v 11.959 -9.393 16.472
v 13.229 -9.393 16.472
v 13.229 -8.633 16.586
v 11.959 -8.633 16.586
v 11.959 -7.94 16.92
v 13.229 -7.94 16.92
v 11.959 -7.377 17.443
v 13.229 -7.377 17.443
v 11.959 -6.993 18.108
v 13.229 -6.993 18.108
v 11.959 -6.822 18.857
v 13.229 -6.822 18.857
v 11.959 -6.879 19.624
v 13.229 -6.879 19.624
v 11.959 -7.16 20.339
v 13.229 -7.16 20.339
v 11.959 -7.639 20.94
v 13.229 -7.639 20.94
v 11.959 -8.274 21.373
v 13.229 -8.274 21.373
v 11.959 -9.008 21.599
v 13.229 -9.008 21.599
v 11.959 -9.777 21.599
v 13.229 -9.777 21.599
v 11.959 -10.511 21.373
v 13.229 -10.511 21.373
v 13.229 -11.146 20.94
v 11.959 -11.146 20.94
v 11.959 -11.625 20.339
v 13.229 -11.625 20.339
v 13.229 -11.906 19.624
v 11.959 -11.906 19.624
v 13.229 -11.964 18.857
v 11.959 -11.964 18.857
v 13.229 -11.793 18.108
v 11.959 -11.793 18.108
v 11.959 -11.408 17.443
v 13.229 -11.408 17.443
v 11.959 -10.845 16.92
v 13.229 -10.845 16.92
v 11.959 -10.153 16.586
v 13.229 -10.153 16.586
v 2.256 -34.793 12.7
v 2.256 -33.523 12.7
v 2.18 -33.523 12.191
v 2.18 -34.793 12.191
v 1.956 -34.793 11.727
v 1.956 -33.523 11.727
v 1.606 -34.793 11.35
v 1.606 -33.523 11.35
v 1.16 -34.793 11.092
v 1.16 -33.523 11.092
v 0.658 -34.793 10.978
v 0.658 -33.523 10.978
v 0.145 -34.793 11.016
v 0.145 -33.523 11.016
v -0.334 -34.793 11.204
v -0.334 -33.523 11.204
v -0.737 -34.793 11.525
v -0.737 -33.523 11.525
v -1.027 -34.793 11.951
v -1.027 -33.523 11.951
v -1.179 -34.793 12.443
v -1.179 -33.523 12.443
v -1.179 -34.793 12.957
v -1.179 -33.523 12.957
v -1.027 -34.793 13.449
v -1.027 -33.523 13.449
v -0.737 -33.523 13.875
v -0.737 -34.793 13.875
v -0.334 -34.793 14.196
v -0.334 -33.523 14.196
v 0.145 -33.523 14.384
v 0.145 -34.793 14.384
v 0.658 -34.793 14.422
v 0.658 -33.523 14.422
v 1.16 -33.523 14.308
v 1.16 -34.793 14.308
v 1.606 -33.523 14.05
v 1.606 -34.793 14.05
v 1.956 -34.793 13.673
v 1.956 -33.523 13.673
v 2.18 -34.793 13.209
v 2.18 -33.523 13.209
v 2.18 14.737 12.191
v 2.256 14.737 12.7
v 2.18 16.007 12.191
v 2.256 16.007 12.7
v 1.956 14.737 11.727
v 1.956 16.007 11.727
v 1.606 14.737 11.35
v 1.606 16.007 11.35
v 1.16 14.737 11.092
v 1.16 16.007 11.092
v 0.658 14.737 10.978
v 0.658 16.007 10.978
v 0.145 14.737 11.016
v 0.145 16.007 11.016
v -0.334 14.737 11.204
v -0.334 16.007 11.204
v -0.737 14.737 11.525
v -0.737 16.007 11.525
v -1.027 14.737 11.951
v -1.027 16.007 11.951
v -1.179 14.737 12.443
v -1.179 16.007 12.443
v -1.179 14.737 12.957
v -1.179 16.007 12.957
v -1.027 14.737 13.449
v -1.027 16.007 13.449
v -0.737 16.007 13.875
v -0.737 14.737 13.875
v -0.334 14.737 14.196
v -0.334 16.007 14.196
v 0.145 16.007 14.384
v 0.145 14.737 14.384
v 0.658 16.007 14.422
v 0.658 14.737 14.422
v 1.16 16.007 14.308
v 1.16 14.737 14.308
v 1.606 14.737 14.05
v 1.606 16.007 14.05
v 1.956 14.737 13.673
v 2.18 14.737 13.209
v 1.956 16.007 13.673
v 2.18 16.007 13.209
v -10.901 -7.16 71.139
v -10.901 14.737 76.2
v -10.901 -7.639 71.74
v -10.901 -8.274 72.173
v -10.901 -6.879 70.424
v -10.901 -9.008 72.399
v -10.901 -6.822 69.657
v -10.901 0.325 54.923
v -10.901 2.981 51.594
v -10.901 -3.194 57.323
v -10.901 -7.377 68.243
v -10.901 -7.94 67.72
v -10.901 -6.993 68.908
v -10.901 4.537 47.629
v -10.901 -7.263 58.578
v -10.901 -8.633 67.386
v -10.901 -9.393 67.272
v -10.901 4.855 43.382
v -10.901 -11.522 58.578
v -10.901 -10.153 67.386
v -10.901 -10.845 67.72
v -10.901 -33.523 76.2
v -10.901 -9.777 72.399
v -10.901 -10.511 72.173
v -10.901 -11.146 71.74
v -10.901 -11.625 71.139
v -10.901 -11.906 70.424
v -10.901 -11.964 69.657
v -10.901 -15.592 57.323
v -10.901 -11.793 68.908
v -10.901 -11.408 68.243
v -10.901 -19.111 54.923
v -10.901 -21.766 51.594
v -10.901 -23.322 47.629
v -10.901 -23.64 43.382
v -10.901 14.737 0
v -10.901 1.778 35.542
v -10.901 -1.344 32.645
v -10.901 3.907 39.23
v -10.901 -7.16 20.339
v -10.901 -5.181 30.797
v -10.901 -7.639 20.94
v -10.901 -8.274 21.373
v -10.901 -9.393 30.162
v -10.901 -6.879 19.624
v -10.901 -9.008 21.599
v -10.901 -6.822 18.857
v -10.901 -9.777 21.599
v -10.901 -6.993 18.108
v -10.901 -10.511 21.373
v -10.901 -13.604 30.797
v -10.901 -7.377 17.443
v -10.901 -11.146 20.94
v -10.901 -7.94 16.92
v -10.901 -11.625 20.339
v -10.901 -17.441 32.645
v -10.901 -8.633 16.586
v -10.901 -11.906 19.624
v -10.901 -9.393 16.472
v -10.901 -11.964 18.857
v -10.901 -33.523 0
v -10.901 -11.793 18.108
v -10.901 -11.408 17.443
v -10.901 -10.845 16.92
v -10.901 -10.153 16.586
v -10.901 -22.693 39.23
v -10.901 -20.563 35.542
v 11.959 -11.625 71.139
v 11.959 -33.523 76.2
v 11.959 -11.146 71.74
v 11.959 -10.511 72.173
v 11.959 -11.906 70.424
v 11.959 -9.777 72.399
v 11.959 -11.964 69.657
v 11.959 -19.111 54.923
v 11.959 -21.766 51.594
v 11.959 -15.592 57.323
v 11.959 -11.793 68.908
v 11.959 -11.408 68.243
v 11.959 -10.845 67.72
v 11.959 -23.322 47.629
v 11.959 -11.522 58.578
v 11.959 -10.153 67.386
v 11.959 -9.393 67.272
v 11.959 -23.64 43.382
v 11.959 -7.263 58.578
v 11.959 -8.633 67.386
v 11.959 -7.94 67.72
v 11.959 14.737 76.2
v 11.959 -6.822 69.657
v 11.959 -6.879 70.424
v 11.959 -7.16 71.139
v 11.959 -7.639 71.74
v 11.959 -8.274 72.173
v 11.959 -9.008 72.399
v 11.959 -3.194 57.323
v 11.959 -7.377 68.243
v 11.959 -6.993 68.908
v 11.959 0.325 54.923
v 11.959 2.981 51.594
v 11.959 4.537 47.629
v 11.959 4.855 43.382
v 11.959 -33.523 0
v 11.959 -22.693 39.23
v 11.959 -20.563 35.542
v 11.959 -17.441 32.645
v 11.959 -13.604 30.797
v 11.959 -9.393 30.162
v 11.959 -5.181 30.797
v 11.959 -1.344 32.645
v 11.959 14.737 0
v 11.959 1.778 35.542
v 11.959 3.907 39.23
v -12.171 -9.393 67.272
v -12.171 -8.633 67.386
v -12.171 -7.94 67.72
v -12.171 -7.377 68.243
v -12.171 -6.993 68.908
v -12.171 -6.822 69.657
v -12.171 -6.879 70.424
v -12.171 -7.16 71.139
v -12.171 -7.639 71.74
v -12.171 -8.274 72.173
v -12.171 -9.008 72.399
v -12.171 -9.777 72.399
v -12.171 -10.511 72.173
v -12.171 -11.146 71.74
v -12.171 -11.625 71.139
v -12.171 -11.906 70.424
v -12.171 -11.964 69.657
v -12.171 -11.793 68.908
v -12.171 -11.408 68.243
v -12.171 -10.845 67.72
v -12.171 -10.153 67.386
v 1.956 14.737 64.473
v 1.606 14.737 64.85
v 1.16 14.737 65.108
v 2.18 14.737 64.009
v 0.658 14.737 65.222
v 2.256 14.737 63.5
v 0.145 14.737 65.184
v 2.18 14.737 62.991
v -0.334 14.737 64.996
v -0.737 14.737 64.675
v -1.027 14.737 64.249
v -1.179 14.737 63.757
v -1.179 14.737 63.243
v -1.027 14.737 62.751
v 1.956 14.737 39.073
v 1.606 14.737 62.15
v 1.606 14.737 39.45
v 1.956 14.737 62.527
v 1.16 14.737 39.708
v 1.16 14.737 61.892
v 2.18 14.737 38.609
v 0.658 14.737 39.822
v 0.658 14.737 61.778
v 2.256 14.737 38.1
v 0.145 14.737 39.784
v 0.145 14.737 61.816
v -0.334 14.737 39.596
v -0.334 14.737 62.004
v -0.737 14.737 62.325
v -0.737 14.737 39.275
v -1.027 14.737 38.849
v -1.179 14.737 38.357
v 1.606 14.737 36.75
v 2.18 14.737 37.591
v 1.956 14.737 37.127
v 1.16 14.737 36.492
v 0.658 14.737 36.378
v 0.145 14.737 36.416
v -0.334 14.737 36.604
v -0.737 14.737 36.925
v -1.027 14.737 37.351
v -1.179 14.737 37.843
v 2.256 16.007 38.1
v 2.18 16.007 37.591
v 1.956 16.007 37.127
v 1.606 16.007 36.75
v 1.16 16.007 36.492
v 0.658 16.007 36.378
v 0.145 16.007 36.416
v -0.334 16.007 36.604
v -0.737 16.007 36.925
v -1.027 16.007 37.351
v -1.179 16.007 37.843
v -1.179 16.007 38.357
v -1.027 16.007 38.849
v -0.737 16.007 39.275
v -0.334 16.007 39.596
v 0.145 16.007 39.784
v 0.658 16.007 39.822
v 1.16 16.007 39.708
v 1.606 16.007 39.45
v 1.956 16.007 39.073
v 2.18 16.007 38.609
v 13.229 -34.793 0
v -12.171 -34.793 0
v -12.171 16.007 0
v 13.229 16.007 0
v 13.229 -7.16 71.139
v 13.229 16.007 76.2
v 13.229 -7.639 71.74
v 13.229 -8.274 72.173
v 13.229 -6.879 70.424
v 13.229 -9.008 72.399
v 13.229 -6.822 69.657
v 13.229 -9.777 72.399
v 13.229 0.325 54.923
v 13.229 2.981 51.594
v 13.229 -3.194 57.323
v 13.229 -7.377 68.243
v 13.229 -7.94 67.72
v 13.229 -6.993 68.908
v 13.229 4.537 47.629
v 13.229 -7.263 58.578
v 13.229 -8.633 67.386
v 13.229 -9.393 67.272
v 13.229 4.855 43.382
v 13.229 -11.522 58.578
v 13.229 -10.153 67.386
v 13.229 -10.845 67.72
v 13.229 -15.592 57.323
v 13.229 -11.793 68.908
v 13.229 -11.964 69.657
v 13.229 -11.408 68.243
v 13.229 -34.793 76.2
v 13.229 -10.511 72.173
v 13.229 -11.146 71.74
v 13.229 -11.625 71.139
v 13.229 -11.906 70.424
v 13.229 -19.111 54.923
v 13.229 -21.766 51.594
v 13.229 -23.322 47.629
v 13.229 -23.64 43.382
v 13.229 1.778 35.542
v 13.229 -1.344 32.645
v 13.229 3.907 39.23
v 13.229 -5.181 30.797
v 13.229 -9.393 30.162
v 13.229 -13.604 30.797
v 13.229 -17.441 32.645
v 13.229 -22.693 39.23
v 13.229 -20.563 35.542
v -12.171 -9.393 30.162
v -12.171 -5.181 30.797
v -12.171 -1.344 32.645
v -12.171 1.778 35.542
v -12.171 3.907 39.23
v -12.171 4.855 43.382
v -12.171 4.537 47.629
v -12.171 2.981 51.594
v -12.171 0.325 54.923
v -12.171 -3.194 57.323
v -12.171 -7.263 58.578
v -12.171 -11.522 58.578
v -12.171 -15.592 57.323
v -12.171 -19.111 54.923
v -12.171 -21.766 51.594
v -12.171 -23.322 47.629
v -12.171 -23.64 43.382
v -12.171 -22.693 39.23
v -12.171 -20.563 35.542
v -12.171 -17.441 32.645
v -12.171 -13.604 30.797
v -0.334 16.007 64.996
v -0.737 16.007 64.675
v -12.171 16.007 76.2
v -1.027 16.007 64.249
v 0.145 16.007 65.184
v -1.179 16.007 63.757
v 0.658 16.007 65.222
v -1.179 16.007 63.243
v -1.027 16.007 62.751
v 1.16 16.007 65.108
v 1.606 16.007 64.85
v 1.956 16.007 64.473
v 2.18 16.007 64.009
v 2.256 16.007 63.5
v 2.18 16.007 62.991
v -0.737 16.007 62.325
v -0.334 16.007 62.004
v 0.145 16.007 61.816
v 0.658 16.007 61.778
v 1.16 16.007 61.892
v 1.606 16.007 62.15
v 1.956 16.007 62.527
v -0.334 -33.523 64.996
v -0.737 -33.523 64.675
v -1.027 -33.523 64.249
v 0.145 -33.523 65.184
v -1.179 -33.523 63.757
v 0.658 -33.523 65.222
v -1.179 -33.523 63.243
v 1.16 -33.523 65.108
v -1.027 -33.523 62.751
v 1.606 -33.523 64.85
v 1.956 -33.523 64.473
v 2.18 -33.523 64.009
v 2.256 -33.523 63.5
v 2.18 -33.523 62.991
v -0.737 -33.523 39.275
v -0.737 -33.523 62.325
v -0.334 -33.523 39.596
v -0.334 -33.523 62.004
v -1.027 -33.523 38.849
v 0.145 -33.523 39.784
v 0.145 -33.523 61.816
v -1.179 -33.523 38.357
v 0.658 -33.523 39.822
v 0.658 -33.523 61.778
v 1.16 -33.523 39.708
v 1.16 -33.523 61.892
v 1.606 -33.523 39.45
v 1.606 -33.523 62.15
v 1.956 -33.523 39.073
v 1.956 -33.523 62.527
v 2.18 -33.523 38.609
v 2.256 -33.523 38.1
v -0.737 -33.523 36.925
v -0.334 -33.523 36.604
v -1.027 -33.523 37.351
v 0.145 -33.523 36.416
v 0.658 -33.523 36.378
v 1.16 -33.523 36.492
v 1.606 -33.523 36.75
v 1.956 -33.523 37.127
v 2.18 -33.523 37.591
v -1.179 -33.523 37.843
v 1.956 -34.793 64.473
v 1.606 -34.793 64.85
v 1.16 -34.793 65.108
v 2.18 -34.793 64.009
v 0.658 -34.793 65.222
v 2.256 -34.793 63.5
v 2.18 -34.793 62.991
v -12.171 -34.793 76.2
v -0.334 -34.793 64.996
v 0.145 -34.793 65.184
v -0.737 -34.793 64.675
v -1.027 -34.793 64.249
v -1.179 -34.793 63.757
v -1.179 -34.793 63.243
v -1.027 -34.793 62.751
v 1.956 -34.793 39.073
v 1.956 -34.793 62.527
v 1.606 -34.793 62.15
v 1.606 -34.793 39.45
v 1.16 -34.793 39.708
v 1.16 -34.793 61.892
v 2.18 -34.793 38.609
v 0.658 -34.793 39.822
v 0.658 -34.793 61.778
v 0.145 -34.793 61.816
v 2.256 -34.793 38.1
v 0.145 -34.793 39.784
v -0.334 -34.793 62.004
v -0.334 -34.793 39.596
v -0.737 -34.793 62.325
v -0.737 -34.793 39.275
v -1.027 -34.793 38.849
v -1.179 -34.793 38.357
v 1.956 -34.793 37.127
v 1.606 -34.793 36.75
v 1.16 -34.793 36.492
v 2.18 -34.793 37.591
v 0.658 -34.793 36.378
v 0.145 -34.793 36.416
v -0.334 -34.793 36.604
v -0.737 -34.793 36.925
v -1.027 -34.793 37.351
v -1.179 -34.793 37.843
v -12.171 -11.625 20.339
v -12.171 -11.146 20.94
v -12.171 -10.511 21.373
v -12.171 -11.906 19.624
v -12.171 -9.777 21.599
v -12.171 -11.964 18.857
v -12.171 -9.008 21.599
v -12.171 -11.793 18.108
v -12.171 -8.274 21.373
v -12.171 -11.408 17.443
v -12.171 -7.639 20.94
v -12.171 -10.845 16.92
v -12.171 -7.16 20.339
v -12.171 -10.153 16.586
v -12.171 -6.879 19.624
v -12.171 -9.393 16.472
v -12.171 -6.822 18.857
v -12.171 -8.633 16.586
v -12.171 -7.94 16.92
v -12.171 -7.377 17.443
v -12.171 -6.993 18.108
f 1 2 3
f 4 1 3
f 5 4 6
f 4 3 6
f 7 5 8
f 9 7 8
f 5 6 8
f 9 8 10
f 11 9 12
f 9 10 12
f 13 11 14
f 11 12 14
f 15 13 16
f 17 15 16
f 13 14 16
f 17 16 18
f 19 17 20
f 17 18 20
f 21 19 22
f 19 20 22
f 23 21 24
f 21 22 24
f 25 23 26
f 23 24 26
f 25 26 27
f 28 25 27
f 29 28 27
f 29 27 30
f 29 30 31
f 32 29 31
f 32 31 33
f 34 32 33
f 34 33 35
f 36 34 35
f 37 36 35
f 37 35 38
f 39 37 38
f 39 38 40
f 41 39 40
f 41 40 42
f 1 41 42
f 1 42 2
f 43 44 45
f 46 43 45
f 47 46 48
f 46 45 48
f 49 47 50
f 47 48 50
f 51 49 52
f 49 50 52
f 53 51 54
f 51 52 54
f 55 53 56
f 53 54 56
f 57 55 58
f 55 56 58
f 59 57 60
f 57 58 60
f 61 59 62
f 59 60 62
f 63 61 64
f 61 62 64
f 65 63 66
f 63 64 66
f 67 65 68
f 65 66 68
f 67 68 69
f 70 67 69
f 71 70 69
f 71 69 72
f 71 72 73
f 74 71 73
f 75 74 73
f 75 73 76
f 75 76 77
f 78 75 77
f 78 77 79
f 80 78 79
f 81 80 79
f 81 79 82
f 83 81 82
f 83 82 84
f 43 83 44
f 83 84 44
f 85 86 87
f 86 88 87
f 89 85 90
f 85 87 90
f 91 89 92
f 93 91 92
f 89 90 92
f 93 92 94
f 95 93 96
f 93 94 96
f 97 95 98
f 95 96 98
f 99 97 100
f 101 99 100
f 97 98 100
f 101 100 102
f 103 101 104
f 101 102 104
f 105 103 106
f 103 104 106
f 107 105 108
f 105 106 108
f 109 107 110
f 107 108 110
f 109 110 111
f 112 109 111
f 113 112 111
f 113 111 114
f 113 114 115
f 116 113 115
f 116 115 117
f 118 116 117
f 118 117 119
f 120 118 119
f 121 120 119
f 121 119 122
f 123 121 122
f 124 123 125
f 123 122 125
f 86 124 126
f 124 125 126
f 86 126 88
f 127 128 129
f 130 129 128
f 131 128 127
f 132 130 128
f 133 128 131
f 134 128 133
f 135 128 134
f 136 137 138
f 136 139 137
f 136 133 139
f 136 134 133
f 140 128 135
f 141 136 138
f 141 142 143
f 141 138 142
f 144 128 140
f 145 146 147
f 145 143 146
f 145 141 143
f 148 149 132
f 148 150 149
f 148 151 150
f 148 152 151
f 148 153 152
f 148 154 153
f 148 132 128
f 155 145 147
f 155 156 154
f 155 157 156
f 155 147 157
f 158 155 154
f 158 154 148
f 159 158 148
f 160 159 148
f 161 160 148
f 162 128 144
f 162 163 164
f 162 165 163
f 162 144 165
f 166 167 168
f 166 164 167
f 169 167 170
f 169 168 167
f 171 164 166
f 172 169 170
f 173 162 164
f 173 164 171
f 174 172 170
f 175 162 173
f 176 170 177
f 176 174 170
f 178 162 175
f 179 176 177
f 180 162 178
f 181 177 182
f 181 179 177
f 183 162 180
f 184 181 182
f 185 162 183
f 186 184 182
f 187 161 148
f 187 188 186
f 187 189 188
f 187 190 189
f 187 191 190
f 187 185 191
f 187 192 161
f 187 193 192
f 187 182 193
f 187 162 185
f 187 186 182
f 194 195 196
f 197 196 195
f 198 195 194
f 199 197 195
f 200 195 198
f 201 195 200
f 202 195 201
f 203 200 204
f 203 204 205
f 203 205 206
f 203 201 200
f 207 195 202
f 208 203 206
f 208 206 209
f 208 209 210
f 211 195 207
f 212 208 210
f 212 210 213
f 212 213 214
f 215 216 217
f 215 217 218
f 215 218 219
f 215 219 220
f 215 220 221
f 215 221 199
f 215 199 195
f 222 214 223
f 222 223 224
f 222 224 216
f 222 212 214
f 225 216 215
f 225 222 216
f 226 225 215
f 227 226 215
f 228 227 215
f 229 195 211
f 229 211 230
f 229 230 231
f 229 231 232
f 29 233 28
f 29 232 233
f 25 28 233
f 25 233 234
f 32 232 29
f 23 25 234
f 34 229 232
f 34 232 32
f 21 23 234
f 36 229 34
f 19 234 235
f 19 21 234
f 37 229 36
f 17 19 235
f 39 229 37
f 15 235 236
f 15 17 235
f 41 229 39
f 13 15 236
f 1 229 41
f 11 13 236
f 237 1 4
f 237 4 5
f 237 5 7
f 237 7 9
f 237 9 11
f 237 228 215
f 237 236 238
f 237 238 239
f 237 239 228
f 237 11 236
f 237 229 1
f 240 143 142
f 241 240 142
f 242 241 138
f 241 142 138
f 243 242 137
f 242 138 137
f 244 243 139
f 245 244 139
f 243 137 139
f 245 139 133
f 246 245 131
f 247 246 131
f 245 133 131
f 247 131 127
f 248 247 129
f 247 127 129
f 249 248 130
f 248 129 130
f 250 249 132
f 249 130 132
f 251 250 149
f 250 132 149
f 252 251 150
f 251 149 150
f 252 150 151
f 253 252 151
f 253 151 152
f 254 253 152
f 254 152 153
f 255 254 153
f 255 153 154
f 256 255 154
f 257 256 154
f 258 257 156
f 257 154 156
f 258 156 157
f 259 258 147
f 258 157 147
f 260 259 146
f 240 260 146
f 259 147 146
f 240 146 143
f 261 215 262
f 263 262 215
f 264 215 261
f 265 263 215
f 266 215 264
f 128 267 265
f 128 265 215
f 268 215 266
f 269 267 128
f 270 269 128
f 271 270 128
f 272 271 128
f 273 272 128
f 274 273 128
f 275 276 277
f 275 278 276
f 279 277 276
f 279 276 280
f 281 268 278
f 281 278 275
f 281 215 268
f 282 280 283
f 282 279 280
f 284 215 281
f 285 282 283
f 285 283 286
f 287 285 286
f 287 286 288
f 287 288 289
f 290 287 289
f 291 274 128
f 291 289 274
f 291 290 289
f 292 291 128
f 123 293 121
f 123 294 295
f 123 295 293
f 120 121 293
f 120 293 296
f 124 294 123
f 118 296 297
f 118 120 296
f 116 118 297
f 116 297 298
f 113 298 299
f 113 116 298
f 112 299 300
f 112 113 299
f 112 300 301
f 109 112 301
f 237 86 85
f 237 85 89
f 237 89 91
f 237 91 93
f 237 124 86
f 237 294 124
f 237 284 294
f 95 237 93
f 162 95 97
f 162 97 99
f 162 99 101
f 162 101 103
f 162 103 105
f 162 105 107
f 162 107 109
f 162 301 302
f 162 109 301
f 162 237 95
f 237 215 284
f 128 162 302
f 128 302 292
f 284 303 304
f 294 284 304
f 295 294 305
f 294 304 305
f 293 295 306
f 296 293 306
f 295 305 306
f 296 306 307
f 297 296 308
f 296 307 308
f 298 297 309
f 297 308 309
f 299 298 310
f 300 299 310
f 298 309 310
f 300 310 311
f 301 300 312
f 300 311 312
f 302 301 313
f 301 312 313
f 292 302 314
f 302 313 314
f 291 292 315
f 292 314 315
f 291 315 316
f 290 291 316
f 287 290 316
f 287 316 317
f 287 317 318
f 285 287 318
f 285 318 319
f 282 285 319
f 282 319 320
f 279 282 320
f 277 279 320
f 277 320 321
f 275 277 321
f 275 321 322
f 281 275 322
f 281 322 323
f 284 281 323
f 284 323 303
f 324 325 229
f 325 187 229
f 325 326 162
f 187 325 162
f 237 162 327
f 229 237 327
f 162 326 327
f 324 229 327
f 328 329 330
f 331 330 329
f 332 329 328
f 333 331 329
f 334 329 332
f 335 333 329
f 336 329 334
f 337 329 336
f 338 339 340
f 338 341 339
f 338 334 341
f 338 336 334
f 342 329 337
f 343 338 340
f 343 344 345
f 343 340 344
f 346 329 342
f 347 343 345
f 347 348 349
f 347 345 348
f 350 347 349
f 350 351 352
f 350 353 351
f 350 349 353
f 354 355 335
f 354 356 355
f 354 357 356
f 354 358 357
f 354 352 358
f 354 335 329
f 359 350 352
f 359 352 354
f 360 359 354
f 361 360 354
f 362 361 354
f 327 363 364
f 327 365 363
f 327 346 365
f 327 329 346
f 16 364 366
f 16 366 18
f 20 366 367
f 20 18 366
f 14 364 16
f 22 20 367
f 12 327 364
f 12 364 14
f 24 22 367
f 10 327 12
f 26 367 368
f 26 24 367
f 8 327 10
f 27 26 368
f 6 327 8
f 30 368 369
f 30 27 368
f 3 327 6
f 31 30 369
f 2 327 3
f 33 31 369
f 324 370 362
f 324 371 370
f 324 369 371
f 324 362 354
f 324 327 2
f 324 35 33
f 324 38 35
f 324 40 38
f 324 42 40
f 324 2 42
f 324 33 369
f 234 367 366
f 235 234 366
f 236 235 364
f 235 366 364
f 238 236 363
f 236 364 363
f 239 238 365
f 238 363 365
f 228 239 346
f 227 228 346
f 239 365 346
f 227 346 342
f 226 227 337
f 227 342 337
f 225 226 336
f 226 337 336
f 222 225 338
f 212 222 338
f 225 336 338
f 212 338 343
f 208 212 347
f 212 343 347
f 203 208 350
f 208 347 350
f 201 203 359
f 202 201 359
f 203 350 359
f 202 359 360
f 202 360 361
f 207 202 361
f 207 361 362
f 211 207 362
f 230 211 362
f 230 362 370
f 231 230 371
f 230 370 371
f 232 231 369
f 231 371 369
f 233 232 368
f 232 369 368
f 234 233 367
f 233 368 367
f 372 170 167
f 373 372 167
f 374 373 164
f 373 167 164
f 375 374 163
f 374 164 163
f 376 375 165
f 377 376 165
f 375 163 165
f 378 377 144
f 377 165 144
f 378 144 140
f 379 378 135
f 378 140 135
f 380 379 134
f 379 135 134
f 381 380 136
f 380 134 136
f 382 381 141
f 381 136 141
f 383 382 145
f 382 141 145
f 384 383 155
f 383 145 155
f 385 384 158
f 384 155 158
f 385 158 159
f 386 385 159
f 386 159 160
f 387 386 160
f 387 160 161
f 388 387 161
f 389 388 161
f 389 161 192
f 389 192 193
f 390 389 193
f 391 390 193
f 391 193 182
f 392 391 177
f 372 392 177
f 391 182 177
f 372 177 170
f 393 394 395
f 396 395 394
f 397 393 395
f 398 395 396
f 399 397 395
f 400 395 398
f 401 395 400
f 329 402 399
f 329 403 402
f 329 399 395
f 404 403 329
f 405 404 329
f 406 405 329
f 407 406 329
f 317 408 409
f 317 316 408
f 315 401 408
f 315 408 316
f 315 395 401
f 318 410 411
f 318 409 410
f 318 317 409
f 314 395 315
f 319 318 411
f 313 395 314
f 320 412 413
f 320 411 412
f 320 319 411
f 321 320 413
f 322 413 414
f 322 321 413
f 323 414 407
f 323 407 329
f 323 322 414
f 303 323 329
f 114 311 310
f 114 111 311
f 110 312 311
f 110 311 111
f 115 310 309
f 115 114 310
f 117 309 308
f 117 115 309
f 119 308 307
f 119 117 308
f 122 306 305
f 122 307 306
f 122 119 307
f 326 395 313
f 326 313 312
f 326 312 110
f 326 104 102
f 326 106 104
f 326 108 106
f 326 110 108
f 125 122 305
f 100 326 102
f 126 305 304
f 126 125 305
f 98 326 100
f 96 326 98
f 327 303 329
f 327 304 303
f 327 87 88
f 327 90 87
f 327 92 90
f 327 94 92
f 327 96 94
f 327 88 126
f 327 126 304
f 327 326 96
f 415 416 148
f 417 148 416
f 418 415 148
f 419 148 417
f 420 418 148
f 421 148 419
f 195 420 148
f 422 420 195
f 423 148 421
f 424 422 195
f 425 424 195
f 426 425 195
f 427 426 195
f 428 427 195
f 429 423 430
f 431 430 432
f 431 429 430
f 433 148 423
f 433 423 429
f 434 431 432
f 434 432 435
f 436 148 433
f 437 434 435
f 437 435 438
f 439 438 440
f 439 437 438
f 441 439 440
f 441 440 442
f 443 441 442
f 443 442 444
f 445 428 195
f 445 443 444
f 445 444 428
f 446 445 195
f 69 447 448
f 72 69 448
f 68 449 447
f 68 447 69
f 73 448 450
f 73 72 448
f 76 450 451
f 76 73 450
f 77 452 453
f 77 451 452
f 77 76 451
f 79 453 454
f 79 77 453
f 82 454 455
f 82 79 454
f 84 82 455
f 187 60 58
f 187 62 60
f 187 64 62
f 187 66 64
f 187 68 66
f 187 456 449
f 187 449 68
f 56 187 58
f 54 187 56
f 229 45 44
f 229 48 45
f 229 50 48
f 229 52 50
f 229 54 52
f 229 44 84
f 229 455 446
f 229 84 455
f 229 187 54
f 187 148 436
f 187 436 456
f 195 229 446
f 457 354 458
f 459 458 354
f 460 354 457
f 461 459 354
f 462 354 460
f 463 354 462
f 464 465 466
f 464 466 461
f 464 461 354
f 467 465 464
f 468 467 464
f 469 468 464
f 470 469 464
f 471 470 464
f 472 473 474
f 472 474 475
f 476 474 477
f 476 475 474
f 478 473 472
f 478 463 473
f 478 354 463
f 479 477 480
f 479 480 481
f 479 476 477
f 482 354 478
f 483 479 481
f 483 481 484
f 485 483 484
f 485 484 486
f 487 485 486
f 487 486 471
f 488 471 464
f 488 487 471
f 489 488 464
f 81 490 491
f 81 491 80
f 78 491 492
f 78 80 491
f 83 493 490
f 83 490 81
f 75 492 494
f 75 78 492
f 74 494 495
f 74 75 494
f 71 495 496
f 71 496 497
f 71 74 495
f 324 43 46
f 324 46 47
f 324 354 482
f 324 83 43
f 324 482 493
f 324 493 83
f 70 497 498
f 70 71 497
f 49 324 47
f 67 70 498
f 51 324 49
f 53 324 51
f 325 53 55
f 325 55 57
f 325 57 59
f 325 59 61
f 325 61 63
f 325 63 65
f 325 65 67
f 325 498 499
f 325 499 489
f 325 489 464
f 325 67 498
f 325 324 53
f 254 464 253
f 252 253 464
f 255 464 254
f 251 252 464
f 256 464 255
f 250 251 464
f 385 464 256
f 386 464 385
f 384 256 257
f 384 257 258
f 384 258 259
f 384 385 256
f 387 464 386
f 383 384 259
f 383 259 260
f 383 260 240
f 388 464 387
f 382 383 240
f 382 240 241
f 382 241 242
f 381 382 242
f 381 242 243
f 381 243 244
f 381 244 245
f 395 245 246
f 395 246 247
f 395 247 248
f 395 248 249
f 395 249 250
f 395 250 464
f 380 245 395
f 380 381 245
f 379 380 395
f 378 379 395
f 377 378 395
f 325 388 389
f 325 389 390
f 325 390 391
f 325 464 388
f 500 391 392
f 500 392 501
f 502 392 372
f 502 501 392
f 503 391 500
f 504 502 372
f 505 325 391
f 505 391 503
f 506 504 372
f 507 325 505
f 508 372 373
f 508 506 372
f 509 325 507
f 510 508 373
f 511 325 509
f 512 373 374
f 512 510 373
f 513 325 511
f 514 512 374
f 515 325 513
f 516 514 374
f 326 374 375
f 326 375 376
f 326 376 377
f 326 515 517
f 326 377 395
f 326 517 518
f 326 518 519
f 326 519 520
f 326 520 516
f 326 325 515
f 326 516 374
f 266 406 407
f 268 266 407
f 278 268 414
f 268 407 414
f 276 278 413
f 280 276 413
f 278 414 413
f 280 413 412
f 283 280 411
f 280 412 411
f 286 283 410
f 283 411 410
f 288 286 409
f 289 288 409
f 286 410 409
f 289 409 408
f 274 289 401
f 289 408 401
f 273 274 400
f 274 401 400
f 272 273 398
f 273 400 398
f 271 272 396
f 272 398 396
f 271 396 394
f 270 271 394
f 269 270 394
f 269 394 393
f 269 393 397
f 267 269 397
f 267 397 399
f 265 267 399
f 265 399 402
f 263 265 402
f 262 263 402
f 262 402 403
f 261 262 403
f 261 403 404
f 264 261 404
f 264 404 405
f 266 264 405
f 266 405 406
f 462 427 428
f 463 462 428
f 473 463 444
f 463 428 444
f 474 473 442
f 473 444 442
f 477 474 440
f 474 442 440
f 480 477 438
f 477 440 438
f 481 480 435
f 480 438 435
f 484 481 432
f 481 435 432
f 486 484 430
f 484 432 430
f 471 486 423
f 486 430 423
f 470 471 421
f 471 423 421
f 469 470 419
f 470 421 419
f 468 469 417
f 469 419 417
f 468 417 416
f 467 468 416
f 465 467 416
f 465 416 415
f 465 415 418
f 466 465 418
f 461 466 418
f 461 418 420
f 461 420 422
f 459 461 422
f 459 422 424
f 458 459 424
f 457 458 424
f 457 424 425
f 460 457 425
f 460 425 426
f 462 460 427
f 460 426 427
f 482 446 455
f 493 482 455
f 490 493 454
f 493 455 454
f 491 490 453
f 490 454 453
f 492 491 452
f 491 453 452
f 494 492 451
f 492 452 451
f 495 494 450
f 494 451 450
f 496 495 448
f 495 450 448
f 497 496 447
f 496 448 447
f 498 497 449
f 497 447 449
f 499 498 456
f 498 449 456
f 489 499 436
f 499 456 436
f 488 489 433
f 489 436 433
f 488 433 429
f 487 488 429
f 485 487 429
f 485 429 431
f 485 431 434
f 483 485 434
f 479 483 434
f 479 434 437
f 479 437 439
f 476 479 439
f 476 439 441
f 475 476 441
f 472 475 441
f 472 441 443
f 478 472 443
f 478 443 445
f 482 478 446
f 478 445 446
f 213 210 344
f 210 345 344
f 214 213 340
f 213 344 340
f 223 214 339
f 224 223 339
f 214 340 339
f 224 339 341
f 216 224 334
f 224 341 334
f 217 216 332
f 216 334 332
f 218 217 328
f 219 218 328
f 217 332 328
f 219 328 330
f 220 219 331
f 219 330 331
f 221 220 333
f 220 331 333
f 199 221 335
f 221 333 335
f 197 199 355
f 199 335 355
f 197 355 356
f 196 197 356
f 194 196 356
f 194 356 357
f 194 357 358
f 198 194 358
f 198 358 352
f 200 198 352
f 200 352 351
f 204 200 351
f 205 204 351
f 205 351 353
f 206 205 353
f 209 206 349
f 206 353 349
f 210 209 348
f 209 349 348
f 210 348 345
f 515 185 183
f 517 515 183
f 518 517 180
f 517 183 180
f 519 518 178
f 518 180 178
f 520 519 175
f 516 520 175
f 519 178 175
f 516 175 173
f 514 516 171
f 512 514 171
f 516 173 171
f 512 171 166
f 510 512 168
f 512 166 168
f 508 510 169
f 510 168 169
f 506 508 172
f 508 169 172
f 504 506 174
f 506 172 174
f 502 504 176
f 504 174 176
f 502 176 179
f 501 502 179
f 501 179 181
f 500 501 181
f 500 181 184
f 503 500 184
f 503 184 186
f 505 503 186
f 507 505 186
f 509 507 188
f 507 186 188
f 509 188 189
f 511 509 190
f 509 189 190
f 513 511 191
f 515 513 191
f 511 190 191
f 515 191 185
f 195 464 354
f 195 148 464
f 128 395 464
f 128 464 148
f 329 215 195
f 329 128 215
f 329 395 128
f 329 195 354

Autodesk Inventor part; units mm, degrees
ref_plane "YZ Plane" through (0, 0, 0) normal (1, 0, 0) x (0, 1, 0)
ref_plane "XZ Plane" through (0, 0, 0) normal (0, 1, 0) x (-1, 0, 0)
ref_plane "XY Plane" through (0, 0, 0) normal (0, 0, 1) x (1, 0, 0)
sketch "Sketch1" plane through (0, 0, 0) normal (0, 0, 1) x (1, 0, 0)
  line L0 (-12.1708, 16.0073) -> (13.2292, 16.0073)
  line L1 (13.2292, 16.0073) -> (13.2292, -34.7927)
  line L2 (13.2292, -34.7927) -> (-12.1708, -34.7927)
  line L3 (-12.1708, -34.7927) -> (-12.1708, 16.0073)
  line L4 (11.9592, 14.7373) -> (-10.9008, 14.7373)
  line L5 (-10.9008, 14.7373) -> (-10.9008, -33.5227)
  line L6 (-10.9008, -33.5227) -> (11.9592, -33.5227)
  line L7 (11.9592, -33.5227) -> (11.9592, 14.7373)
  point P0 (0, 0)
  dimension "d0" = 25.4
  dimension "d1" = 50.8
  dimension "d2" = 1.27
extrude "Extrusion1" add sketch "Sketch1" along normal blind 76.2
sketch "Sketch2" plane through (-12.1708, 16.0073, 0) normal (0, 1, 0) x (1, 0, 0)
  circle A0 centre (12.7, -12.7) radius 1.7272
  line L0 (25.4, 0) -> (0, 0) projected
  line L1 (0, 0) -> (0, -76.2) projected
  point P0 (12.1708, 0)
  dimension "d5" = 3.4544
  dimension "d6" = 12.7
  dimension "d7" = 12.7
extrude "Extrusion2" cut sketch "Sketch2" against normal through all
pattern_linear "Rectangular Pattern1" count 8 spacing 25.4 along (0, 0, 1) of "Extrusion2"
sketch "Sketch3" plane through (13.2292, -34.7927, 0) normal (1, 0, 0) x (0, 0, -1)
  circle A0 centre (-44.45, 25.4) radius 14.2875
  line L0 (0, 0) -> (0, 50.8) projected
  line L1 (-76.2, 0) -> (-76.2, 50.8) projected
  circle A1 centre (-69.85, 25.4) radius 2.5781
  circle A2 centre (-19.05, 25.4) radius 2.5781
  line L2 (-76.2, 50.8) -> (-76.2, 0) construction
  line L3 (-76.2, 25.4) -> (0, 25.4) construction
  line L4 (0, 1.27) -> (0, 49.53) construction
  line L5 (0, 0) -> (-76.2, 0) construction
  point P0 (0, 34.7927)
  dimension "d15" = 28.575
  dimension "d19" = 31.75
  dimension "d20" = 5.1562
  dimension "d21" = 5.1562
  dimension "d22" = 25.4
  dimension "d23" = 25.4
  dimension "d24" = 25.4
extrude "Extrusion3" cut sketch "Sketch3" against normal through all contours A0
extrude "Extrusion4" cut sketch "Sketch3" against normal through all contours A1 | A2
equation "\"d3\" = d13"
equation "\"d10\" = d14"
equation "\"d13\" = 76.2"
equation "\"d14\" = d13"
properties part number "VerseFrame 5in STOCK"
